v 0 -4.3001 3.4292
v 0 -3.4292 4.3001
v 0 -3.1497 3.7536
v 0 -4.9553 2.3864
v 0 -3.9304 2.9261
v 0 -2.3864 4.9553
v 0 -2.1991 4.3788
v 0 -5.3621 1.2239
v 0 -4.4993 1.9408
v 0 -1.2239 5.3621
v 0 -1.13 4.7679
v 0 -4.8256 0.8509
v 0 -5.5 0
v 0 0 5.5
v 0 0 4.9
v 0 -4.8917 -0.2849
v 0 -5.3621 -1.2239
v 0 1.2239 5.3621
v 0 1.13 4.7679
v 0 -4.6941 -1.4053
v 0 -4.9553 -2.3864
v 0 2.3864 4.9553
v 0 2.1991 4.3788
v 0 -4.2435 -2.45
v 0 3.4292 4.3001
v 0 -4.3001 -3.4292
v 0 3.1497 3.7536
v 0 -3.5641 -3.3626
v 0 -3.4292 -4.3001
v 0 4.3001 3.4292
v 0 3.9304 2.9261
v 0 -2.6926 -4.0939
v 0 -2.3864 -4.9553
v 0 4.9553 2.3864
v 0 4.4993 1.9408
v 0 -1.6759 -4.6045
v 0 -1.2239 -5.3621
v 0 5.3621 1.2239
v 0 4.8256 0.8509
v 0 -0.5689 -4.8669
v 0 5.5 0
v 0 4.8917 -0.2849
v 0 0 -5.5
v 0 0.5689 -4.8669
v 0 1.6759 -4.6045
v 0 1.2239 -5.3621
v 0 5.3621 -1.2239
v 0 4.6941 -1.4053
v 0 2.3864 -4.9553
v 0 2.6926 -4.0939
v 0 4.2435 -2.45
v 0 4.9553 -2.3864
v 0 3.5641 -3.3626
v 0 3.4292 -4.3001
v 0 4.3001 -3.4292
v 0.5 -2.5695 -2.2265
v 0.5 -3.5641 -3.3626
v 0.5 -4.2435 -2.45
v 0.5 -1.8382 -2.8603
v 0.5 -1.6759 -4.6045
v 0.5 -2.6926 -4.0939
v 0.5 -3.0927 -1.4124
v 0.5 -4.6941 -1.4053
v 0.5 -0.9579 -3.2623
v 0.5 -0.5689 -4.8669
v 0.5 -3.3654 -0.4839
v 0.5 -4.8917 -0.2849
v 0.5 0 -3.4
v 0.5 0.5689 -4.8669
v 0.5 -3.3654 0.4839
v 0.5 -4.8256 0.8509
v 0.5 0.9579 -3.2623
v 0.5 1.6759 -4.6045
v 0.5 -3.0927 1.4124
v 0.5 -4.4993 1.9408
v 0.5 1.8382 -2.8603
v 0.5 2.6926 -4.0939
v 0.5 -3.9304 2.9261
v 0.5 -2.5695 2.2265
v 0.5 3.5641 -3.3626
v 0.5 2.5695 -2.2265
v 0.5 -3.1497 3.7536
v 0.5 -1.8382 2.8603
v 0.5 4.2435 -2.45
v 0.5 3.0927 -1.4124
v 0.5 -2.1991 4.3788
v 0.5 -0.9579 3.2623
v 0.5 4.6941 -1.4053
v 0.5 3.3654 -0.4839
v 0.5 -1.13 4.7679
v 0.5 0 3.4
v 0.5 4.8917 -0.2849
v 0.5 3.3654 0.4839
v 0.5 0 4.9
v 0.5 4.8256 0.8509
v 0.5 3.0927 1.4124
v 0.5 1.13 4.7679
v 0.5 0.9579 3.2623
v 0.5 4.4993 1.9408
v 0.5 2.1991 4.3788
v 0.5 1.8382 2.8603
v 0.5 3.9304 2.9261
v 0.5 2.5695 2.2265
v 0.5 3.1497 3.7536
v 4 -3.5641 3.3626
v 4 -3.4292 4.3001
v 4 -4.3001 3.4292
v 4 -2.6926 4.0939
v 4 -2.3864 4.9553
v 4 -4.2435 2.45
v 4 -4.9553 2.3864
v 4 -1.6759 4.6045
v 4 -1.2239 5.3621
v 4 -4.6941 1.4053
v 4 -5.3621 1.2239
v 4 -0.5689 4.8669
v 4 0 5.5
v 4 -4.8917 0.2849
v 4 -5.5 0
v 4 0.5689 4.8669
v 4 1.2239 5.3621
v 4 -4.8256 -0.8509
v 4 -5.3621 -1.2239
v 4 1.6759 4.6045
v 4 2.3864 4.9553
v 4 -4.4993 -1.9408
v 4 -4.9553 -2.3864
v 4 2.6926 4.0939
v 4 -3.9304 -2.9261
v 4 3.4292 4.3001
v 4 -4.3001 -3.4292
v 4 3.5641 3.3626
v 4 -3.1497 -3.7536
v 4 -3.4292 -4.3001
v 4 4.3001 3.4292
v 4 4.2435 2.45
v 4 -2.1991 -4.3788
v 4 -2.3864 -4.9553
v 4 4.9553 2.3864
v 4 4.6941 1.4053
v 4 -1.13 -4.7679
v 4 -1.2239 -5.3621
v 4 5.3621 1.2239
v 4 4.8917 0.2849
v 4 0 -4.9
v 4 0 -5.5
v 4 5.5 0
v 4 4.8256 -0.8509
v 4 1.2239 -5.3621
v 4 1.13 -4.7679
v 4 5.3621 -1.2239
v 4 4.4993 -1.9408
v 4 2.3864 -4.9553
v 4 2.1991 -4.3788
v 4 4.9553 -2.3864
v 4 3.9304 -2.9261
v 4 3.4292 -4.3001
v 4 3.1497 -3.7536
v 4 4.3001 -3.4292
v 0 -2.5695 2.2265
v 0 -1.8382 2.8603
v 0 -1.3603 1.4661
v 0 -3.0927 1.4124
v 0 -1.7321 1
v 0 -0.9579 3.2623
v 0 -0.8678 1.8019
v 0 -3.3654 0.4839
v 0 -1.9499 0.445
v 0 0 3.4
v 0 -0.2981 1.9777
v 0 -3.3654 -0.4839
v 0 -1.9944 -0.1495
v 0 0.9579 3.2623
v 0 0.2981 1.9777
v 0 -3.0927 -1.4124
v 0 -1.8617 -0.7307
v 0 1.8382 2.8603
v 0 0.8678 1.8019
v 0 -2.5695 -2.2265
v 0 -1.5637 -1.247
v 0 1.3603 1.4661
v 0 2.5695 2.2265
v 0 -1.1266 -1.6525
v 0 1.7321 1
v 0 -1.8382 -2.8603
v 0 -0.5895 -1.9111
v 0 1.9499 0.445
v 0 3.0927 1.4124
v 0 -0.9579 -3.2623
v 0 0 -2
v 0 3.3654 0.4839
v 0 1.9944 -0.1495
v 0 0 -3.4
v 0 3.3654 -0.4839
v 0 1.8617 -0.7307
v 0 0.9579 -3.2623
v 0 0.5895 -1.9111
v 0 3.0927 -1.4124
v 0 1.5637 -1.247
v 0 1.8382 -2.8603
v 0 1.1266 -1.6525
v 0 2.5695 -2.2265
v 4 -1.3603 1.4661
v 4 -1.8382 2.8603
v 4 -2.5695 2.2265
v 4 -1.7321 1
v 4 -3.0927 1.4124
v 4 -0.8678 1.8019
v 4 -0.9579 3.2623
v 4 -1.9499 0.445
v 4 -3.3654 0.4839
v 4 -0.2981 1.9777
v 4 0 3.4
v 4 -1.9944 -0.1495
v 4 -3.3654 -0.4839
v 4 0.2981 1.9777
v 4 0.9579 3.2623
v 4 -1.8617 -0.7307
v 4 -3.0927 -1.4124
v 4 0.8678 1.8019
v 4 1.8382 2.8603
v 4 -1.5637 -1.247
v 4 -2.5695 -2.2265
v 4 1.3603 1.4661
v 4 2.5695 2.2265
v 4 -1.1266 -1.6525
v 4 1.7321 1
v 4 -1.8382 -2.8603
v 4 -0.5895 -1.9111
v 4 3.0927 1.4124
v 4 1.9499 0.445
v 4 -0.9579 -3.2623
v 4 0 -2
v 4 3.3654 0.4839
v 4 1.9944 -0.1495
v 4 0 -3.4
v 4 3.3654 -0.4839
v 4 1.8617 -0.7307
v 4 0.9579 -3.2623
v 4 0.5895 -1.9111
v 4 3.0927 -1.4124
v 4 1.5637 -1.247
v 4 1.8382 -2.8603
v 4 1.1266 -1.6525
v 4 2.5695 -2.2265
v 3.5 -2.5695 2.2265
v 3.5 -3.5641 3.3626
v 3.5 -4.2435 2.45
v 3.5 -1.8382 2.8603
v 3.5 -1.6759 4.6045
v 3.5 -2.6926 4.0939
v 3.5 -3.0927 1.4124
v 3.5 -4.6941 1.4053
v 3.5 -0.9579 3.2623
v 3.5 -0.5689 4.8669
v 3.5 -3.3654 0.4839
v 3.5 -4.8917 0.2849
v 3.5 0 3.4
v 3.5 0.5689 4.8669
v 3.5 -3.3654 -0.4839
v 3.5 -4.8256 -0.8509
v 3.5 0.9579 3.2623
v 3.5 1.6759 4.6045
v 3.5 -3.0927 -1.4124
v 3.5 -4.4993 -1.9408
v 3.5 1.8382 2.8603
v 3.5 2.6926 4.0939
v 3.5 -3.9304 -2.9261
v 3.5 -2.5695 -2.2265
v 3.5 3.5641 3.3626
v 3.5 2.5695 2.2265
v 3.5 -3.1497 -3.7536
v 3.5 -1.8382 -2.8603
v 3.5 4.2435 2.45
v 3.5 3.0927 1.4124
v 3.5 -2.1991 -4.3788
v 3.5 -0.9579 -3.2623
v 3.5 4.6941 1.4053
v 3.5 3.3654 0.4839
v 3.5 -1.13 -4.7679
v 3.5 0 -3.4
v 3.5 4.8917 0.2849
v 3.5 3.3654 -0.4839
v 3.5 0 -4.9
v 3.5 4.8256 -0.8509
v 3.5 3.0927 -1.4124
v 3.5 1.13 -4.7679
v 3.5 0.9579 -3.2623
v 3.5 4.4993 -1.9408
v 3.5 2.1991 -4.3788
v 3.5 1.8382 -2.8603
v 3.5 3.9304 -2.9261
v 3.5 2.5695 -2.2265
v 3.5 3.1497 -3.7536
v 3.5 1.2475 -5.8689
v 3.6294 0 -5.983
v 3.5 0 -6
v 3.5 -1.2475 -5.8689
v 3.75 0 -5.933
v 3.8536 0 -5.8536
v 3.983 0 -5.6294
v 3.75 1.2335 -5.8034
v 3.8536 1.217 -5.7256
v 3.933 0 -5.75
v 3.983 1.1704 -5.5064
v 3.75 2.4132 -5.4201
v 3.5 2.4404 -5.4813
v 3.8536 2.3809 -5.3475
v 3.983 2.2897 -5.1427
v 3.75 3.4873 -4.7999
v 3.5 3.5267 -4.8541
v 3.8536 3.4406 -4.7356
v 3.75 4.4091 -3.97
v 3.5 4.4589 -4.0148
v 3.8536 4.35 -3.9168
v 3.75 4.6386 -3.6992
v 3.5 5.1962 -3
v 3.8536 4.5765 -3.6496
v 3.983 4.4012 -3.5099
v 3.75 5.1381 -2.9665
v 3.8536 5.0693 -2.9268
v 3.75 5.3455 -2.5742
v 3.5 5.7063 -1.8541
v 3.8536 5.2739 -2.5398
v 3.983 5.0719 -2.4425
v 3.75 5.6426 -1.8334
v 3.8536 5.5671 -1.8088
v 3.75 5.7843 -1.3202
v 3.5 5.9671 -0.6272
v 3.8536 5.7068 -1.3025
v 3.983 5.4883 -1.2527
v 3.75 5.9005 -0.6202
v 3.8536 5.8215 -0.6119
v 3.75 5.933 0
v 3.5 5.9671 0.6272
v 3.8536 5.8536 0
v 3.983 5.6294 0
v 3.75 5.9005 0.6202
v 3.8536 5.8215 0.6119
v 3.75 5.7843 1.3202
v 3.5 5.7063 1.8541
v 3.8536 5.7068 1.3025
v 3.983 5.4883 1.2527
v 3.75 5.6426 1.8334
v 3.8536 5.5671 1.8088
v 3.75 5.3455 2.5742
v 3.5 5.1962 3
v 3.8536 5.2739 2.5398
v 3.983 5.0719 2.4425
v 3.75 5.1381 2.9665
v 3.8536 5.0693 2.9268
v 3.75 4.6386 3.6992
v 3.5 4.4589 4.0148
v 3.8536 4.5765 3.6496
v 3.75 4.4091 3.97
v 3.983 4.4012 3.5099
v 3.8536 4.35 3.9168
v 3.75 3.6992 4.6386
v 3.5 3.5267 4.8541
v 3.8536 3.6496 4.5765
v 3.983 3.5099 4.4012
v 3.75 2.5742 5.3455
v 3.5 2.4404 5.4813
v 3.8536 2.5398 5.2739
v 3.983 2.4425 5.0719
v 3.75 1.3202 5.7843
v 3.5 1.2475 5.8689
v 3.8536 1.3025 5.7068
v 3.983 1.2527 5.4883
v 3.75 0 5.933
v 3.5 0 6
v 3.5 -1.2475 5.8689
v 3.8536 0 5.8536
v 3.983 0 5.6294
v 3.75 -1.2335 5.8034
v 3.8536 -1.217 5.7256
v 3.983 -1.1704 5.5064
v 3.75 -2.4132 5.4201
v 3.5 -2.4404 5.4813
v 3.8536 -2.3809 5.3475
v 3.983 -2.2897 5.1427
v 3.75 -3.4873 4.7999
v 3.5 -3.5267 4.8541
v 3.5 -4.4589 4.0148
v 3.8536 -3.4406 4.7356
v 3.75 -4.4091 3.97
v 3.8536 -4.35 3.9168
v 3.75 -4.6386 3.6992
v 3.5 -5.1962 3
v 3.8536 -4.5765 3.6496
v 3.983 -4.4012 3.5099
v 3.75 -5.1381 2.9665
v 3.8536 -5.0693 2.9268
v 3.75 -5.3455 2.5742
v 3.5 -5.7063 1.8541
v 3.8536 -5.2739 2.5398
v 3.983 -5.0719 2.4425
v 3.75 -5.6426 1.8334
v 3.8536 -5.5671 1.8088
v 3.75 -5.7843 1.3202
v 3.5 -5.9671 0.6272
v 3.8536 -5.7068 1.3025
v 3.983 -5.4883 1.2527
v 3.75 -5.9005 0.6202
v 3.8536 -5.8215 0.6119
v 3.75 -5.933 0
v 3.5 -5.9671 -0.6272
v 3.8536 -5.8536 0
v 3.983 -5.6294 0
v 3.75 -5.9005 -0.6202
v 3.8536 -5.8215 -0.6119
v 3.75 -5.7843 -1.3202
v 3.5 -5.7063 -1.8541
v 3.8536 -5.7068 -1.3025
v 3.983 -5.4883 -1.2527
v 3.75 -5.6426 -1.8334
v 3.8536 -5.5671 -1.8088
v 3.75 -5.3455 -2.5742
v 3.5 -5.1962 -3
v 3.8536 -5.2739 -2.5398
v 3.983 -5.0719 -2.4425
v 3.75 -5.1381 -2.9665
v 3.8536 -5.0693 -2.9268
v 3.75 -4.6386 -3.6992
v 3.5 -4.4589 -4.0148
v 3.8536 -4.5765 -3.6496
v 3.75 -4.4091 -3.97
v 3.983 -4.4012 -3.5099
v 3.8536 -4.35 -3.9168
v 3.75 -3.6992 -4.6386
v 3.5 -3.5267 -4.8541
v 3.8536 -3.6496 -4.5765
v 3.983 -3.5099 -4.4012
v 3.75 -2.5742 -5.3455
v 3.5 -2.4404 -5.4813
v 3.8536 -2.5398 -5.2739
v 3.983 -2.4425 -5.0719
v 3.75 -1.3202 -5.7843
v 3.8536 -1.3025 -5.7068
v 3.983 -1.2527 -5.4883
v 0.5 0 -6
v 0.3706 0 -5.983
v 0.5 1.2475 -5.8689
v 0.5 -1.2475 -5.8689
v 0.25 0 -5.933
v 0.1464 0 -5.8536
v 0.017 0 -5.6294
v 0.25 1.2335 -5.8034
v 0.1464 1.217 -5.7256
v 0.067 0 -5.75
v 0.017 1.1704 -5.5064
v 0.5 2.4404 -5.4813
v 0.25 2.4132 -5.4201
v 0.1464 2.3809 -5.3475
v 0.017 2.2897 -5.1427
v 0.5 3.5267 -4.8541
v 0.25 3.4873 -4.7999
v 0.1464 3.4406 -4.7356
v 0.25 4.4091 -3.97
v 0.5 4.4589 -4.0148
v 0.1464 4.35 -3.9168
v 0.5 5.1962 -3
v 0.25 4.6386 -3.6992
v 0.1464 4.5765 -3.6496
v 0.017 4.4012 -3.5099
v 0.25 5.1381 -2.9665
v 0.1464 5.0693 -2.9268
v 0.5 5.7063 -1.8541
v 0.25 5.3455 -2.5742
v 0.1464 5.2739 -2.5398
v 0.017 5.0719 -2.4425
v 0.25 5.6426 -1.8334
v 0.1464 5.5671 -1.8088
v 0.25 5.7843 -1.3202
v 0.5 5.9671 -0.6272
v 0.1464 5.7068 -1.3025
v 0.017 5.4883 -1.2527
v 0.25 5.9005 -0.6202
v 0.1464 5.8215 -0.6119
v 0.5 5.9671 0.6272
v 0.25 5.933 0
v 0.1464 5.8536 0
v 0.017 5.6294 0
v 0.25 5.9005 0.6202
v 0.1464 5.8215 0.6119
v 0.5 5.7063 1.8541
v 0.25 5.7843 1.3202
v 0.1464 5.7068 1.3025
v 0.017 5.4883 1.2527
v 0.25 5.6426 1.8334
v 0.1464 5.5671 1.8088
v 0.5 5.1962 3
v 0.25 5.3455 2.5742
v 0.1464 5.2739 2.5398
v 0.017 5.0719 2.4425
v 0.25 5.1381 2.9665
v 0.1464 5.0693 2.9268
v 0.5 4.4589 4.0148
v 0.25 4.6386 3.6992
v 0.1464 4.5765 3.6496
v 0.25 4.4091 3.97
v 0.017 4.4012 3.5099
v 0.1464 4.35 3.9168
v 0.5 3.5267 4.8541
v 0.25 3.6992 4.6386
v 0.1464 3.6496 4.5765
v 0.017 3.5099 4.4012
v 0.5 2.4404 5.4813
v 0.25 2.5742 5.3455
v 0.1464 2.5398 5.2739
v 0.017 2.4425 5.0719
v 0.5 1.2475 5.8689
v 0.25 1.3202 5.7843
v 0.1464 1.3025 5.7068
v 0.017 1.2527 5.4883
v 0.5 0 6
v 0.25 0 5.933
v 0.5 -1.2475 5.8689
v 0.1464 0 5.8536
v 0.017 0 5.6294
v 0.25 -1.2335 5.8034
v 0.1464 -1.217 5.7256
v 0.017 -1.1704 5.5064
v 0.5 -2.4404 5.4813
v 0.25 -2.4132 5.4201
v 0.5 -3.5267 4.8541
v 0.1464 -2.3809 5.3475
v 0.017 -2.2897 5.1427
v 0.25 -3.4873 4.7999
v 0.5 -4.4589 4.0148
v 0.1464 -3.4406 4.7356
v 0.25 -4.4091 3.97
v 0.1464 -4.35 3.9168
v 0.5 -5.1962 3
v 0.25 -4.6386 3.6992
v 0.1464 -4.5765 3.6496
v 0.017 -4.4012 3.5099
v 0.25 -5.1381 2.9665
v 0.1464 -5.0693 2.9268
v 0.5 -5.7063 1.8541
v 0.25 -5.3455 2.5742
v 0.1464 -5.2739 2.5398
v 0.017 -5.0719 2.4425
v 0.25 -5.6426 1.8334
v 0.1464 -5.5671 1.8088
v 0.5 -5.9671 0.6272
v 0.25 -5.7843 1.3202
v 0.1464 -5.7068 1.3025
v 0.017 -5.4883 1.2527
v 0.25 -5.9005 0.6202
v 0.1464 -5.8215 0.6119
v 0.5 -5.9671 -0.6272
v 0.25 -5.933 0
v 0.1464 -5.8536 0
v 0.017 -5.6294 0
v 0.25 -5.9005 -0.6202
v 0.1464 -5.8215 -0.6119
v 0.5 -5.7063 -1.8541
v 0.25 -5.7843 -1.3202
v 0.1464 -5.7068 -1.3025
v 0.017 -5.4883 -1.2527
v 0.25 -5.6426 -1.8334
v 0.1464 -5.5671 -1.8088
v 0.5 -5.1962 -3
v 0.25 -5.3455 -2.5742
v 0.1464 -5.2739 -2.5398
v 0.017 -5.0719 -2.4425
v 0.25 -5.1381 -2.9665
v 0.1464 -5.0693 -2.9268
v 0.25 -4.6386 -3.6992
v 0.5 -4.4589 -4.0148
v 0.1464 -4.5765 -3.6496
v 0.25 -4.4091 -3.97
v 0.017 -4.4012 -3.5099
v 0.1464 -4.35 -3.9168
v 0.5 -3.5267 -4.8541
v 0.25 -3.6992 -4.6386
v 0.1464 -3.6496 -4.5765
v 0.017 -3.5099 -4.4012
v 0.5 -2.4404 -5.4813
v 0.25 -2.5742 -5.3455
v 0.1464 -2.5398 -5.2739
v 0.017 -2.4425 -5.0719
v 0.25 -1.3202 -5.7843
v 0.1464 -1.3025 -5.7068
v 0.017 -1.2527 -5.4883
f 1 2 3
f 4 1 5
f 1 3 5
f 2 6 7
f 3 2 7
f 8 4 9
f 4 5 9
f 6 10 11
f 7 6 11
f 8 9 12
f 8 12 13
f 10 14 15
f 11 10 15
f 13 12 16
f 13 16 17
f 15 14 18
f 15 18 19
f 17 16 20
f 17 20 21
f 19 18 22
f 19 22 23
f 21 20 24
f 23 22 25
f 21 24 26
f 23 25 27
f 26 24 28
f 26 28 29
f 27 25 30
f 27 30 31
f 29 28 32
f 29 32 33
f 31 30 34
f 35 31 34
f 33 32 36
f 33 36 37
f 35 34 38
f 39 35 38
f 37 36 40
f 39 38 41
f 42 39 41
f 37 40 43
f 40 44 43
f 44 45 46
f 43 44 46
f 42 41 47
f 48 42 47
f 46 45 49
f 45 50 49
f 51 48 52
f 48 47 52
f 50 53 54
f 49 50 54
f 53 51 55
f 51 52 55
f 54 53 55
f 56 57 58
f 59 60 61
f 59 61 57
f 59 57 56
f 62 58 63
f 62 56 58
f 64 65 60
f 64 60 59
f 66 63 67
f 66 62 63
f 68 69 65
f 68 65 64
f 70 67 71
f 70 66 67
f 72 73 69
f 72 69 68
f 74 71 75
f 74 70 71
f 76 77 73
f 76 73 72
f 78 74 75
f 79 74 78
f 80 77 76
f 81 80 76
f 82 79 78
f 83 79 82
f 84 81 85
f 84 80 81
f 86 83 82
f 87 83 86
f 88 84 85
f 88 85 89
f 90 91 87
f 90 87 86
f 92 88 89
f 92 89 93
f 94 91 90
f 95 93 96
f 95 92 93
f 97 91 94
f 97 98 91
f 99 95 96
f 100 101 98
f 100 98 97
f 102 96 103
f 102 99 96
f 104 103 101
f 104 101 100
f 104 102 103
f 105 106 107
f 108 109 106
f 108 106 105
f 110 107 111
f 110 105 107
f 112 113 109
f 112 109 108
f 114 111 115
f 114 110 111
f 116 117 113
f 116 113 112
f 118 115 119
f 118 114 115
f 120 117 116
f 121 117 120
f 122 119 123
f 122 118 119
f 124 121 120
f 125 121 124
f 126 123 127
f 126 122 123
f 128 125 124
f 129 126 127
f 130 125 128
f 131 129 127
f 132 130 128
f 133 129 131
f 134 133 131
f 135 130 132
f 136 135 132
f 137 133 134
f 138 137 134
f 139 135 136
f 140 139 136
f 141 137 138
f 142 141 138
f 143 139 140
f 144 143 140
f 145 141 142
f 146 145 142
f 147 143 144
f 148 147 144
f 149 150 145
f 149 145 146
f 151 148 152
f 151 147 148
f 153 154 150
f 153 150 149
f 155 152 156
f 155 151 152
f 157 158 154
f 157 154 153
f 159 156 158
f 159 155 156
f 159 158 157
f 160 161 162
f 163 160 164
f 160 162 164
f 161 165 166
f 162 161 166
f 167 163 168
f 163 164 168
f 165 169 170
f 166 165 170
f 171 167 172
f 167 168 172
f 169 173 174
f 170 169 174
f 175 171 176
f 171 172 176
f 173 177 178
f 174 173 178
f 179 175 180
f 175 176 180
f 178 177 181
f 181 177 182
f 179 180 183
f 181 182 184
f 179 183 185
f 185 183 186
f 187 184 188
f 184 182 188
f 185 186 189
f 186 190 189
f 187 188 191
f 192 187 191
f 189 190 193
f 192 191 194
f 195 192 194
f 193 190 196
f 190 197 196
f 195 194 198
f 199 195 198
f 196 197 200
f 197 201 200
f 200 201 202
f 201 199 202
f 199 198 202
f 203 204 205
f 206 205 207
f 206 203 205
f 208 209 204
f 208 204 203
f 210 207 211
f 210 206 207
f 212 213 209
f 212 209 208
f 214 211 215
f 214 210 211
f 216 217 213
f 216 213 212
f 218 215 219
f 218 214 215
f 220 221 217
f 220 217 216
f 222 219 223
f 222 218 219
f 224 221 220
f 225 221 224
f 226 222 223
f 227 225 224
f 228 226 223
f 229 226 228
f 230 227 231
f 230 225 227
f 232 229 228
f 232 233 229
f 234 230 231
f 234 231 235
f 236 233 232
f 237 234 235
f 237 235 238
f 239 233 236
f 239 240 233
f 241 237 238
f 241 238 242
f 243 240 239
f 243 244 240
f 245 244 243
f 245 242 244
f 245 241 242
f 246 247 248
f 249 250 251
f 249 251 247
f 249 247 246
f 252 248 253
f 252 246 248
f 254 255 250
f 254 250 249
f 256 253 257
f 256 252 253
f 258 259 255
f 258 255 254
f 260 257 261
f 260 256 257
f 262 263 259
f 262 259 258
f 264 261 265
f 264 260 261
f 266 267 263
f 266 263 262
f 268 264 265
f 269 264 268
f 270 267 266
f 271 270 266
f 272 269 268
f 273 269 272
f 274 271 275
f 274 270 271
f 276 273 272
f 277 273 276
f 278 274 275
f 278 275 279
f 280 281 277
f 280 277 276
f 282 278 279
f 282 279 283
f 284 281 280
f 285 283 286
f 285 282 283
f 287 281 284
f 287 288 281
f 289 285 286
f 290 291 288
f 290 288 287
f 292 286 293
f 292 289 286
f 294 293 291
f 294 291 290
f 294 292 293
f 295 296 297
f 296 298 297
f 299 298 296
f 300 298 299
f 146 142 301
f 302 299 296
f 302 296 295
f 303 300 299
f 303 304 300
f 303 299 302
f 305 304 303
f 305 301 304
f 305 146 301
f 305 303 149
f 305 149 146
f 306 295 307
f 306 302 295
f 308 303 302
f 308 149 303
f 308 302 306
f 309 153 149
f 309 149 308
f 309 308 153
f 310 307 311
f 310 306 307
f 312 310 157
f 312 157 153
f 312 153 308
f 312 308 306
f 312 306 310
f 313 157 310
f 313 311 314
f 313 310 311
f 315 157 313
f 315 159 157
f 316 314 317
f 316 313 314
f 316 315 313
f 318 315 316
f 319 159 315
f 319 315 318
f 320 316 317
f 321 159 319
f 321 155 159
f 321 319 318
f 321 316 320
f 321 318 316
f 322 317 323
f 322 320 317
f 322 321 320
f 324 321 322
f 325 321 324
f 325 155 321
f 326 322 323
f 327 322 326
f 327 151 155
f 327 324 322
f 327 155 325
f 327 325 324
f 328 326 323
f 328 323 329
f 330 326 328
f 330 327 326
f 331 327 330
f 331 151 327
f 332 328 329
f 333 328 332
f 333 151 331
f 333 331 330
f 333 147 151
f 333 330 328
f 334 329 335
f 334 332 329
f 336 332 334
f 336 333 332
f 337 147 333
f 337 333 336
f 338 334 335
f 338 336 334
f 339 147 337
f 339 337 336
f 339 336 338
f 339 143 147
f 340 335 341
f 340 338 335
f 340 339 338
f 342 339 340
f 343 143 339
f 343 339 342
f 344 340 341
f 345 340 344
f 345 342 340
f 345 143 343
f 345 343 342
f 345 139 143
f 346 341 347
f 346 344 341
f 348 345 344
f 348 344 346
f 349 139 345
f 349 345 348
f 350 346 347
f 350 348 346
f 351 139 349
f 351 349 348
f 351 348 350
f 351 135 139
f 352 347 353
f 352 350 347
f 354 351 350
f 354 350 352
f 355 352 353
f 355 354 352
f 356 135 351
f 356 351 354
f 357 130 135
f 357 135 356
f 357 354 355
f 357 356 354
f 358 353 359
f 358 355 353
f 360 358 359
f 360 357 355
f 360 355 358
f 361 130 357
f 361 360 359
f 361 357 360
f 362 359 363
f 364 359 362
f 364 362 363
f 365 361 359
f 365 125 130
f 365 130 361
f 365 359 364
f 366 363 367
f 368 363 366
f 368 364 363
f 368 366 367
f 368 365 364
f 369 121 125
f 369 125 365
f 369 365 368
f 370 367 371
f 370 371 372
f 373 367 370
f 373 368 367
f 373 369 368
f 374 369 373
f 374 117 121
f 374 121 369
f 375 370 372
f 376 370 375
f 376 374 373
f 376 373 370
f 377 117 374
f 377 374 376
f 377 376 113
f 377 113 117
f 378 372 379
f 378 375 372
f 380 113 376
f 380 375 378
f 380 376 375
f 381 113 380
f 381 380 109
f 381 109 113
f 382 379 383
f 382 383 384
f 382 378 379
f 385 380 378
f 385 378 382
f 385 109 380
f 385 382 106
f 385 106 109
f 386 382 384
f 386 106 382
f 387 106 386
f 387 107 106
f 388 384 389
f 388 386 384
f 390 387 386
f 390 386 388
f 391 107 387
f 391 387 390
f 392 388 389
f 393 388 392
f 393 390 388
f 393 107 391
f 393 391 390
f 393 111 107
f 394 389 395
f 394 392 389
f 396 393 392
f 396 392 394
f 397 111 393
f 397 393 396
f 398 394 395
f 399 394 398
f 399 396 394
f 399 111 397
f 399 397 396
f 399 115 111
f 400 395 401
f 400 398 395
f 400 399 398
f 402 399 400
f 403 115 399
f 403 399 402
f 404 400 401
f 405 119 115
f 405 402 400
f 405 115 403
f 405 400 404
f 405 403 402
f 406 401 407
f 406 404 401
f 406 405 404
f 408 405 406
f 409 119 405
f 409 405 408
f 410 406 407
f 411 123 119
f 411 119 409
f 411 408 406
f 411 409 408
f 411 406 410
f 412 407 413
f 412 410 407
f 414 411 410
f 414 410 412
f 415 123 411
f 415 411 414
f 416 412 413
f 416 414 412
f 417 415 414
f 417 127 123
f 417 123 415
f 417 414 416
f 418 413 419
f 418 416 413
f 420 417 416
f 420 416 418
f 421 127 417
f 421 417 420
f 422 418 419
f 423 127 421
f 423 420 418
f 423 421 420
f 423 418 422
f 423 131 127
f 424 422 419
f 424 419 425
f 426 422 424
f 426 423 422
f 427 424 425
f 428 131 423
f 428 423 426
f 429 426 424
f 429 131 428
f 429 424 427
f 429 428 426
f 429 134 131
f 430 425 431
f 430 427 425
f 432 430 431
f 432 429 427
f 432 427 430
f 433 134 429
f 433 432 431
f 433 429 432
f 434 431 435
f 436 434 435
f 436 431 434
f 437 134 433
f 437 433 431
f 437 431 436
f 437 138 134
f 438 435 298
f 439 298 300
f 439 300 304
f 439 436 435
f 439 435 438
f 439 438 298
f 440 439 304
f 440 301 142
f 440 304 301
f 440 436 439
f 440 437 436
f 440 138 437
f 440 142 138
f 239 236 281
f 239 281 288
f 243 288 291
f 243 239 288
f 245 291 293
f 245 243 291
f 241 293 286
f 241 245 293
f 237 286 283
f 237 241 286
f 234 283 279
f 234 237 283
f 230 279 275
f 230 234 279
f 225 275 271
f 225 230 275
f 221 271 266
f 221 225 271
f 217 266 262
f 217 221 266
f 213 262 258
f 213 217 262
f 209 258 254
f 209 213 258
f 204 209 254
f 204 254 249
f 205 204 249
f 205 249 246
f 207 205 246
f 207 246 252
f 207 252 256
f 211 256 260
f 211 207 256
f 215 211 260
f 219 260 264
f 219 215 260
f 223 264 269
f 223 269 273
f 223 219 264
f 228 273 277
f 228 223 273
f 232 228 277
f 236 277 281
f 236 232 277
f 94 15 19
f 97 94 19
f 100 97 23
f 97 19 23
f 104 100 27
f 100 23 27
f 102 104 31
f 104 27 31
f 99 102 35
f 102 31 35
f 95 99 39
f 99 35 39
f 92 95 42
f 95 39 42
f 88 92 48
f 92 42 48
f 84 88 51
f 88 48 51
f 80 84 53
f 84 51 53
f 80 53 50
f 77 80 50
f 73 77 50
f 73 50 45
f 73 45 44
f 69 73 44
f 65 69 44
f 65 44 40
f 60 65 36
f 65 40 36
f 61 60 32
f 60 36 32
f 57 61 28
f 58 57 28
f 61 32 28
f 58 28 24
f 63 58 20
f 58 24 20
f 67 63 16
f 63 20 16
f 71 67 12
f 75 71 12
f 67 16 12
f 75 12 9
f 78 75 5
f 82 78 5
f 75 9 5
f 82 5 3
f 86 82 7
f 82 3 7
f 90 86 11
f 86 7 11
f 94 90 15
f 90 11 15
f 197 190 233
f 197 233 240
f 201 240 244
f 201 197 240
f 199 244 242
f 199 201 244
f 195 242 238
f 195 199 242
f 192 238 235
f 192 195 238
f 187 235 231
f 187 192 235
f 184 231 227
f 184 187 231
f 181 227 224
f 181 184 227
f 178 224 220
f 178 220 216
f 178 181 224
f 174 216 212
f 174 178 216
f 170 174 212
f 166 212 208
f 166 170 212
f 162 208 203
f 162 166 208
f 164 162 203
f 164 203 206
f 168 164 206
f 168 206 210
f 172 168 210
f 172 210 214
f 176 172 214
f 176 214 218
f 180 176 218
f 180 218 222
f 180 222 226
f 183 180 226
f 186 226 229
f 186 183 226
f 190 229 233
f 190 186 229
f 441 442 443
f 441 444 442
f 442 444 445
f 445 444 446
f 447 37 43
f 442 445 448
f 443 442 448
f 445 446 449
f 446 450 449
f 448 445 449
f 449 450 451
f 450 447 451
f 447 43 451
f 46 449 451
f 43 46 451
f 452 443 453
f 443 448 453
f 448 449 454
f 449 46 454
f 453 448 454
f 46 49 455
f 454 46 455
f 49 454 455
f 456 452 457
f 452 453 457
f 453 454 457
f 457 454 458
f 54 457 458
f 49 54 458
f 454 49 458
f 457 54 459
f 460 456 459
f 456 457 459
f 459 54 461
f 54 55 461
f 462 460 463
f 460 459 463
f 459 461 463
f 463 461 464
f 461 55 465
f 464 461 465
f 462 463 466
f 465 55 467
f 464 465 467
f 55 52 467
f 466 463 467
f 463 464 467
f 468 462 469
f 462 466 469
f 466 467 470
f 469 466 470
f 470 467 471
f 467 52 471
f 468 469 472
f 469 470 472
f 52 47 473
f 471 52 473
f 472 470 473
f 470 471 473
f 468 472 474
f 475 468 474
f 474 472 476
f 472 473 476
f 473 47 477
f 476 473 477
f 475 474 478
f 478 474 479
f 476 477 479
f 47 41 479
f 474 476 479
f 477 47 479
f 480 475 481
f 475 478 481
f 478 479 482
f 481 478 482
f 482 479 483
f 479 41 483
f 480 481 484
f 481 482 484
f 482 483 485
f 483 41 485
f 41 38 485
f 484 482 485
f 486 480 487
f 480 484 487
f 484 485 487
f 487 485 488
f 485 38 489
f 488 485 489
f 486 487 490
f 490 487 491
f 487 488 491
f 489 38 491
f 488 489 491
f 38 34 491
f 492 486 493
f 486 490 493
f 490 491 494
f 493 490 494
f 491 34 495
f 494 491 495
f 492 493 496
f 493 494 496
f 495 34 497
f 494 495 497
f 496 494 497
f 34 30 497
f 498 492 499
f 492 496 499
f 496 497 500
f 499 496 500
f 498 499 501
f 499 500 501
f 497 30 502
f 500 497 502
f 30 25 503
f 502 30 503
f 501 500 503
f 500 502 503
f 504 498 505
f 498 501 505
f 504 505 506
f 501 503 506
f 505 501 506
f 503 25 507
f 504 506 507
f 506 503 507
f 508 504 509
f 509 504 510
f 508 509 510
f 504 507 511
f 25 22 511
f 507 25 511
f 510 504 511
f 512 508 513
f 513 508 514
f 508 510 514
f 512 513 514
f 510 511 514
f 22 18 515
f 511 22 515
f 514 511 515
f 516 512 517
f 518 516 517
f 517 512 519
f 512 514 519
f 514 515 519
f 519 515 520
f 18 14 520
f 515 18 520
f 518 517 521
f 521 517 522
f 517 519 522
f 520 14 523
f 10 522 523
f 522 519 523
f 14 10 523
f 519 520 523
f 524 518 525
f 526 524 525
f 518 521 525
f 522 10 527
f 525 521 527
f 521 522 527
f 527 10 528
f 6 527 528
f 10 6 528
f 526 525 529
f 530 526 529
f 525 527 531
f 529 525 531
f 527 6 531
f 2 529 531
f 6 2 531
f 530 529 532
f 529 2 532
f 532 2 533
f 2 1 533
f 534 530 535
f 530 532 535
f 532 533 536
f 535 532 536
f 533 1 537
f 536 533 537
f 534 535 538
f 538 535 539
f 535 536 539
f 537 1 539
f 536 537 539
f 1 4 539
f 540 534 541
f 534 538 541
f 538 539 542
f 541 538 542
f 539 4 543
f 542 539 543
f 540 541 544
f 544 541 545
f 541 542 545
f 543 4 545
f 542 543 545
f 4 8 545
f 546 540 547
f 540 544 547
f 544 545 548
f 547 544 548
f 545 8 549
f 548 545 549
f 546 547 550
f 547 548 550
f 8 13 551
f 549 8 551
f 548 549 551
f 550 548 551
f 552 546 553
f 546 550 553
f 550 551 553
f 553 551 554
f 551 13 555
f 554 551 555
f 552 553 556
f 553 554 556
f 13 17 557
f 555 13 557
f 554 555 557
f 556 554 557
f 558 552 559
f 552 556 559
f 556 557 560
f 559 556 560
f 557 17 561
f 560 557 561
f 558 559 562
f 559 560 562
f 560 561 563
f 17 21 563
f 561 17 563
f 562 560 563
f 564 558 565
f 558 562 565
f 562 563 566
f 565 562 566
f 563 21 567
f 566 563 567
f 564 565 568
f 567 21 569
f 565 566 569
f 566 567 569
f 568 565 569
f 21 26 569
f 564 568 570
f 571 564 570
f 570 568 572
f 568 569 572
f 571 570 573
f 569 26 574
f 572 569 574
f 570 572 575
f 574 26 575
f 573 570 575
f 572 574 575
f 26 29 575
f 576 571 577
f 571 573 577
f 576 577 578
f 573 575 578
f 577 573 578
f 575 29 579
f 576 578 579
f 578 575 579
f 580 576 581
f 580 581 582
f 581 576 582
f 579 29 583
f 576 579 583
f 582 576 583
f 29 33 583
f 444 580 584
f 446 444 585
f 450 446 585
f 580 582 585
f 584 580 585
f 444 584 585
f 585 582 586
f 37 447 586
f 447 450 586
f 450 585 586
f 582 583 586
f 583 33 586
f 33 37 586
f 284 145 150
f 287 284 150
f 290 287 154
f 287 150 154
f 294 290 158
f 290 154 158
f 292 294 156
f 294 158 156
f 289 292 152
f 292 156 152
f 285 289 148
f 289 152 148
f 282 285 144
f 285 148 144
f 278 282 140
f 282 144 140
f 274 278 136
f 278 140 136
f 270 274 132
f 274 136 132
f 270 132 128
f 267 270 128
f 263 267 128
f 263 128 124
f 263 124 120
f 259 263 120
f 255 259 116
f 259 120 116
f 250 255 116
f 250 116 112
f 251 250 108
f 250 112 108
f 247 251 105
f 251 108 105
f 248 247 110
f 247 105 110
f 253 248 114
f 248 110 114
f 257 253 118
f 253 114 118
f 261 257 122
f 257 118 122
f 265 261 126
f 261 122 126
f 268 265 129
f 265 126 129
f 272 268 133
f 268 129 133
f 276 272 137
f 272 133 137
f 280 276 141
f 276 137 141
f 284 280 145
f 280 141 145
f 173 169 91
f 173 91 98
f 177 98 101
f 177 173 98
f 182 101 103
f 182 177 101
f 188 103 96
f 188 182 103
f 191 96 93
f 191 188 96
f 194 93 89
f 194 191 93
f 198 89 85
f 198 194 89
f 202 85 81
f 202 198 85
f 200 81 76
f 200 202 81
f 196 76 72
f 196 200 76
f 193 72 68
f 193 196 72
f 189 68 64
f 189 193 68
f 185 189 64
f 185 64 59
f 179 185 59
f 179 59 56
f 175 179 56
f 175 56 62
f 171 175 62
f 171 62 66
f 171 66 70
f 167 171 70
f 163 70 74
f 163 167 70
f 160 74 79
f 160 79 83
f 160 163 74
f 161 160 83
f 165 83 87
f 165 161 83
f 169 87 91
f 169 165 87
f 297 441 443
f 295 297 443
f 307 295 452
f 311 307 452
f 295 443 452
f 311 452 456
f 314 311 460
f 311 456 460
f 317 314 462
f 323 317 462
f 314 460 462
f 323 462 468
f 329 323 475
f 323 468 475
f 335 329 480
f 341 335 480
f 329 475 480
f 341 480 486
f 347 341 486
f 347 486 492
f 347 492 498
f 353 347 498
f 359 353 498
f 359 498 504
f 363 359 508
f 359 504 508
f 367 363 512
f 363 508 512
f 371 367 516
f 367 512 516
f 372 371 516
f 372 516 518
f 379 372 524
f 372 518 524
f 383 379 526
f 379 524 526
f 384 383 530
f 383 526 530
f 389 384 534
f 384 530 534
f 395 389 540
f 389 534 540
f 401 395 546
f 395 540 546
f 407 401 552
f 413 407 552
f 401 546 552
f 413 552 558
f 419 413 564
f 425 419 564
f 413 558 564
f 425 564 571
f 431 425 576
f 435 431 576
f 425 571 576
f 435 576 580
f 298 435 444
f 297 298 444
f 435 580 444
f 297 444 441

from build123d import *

# Parameters (mm, degrees)
SKETCH1_R           = 6
SKETCH1_R_2         = 2
BOSS_EXTRUDE1_DEPTH = 4
FILLET1_R           = 0.5
SKETCH2_R           = 4.9
SKETCH2_R_2         = 3.4
CUT_EXTRUDE1_DEPTH  = 0.5
SKETCH3_R           = 4.9
SKETCH3_R_2         = 3.4
CUT_EXTRUDE2_DEPTH  = 0.5


with BuildPart() as part:
    # Sketch1 → Boss-Extrude1 (new body)
    with BuildSketch(Plane(origin=(0, 0, 0), x_dir=(0, 0, -1), z_dir=(1, 0, 0))):
        Circle(SKETCH1_R)
        Circle(SKETCH1_R_2, mode=Mode.SUBTRACT)
    extrude(amount=BOSS_EXTRUDE1_DEPTH)

    # Fillet1
    fillet1_edges = [part.edges().sort_by_distance(p)[0] for p in [
        (0, 0, 6),
        (4, 0, 6),
    ]]
    fillet(fillet1_edges, radius=FILLET1_R)

    # Sketch2 → Cut-Extrude1 (cut)
    with BuildSketch(Plane(origin=(4, 0, 0), x_dir=(0, 0, -1), z_dir=(1, 0, 0))):
        Circle(SKETCH2_R)
        Circle(SKETCH2_R_2, mode=Mode.SUBTRACT)
    extrude(amount=-CUT_EXTRUDE1_DEPTH, mode=Mode.SUBTRACT)

    # Sketch3 → Cut-Extrude2 (cut)
    with BuildSketch(Plane.ZY):
        Circle(SKETCH3_R)
        Circle(SKETCH3_R_2, mode=Mode.SUBTRACT)
    extrude(amount=-CUT_EXTRUDE2_DEPTH, mode=Mode.SUBTRACT)


solid = part.part
